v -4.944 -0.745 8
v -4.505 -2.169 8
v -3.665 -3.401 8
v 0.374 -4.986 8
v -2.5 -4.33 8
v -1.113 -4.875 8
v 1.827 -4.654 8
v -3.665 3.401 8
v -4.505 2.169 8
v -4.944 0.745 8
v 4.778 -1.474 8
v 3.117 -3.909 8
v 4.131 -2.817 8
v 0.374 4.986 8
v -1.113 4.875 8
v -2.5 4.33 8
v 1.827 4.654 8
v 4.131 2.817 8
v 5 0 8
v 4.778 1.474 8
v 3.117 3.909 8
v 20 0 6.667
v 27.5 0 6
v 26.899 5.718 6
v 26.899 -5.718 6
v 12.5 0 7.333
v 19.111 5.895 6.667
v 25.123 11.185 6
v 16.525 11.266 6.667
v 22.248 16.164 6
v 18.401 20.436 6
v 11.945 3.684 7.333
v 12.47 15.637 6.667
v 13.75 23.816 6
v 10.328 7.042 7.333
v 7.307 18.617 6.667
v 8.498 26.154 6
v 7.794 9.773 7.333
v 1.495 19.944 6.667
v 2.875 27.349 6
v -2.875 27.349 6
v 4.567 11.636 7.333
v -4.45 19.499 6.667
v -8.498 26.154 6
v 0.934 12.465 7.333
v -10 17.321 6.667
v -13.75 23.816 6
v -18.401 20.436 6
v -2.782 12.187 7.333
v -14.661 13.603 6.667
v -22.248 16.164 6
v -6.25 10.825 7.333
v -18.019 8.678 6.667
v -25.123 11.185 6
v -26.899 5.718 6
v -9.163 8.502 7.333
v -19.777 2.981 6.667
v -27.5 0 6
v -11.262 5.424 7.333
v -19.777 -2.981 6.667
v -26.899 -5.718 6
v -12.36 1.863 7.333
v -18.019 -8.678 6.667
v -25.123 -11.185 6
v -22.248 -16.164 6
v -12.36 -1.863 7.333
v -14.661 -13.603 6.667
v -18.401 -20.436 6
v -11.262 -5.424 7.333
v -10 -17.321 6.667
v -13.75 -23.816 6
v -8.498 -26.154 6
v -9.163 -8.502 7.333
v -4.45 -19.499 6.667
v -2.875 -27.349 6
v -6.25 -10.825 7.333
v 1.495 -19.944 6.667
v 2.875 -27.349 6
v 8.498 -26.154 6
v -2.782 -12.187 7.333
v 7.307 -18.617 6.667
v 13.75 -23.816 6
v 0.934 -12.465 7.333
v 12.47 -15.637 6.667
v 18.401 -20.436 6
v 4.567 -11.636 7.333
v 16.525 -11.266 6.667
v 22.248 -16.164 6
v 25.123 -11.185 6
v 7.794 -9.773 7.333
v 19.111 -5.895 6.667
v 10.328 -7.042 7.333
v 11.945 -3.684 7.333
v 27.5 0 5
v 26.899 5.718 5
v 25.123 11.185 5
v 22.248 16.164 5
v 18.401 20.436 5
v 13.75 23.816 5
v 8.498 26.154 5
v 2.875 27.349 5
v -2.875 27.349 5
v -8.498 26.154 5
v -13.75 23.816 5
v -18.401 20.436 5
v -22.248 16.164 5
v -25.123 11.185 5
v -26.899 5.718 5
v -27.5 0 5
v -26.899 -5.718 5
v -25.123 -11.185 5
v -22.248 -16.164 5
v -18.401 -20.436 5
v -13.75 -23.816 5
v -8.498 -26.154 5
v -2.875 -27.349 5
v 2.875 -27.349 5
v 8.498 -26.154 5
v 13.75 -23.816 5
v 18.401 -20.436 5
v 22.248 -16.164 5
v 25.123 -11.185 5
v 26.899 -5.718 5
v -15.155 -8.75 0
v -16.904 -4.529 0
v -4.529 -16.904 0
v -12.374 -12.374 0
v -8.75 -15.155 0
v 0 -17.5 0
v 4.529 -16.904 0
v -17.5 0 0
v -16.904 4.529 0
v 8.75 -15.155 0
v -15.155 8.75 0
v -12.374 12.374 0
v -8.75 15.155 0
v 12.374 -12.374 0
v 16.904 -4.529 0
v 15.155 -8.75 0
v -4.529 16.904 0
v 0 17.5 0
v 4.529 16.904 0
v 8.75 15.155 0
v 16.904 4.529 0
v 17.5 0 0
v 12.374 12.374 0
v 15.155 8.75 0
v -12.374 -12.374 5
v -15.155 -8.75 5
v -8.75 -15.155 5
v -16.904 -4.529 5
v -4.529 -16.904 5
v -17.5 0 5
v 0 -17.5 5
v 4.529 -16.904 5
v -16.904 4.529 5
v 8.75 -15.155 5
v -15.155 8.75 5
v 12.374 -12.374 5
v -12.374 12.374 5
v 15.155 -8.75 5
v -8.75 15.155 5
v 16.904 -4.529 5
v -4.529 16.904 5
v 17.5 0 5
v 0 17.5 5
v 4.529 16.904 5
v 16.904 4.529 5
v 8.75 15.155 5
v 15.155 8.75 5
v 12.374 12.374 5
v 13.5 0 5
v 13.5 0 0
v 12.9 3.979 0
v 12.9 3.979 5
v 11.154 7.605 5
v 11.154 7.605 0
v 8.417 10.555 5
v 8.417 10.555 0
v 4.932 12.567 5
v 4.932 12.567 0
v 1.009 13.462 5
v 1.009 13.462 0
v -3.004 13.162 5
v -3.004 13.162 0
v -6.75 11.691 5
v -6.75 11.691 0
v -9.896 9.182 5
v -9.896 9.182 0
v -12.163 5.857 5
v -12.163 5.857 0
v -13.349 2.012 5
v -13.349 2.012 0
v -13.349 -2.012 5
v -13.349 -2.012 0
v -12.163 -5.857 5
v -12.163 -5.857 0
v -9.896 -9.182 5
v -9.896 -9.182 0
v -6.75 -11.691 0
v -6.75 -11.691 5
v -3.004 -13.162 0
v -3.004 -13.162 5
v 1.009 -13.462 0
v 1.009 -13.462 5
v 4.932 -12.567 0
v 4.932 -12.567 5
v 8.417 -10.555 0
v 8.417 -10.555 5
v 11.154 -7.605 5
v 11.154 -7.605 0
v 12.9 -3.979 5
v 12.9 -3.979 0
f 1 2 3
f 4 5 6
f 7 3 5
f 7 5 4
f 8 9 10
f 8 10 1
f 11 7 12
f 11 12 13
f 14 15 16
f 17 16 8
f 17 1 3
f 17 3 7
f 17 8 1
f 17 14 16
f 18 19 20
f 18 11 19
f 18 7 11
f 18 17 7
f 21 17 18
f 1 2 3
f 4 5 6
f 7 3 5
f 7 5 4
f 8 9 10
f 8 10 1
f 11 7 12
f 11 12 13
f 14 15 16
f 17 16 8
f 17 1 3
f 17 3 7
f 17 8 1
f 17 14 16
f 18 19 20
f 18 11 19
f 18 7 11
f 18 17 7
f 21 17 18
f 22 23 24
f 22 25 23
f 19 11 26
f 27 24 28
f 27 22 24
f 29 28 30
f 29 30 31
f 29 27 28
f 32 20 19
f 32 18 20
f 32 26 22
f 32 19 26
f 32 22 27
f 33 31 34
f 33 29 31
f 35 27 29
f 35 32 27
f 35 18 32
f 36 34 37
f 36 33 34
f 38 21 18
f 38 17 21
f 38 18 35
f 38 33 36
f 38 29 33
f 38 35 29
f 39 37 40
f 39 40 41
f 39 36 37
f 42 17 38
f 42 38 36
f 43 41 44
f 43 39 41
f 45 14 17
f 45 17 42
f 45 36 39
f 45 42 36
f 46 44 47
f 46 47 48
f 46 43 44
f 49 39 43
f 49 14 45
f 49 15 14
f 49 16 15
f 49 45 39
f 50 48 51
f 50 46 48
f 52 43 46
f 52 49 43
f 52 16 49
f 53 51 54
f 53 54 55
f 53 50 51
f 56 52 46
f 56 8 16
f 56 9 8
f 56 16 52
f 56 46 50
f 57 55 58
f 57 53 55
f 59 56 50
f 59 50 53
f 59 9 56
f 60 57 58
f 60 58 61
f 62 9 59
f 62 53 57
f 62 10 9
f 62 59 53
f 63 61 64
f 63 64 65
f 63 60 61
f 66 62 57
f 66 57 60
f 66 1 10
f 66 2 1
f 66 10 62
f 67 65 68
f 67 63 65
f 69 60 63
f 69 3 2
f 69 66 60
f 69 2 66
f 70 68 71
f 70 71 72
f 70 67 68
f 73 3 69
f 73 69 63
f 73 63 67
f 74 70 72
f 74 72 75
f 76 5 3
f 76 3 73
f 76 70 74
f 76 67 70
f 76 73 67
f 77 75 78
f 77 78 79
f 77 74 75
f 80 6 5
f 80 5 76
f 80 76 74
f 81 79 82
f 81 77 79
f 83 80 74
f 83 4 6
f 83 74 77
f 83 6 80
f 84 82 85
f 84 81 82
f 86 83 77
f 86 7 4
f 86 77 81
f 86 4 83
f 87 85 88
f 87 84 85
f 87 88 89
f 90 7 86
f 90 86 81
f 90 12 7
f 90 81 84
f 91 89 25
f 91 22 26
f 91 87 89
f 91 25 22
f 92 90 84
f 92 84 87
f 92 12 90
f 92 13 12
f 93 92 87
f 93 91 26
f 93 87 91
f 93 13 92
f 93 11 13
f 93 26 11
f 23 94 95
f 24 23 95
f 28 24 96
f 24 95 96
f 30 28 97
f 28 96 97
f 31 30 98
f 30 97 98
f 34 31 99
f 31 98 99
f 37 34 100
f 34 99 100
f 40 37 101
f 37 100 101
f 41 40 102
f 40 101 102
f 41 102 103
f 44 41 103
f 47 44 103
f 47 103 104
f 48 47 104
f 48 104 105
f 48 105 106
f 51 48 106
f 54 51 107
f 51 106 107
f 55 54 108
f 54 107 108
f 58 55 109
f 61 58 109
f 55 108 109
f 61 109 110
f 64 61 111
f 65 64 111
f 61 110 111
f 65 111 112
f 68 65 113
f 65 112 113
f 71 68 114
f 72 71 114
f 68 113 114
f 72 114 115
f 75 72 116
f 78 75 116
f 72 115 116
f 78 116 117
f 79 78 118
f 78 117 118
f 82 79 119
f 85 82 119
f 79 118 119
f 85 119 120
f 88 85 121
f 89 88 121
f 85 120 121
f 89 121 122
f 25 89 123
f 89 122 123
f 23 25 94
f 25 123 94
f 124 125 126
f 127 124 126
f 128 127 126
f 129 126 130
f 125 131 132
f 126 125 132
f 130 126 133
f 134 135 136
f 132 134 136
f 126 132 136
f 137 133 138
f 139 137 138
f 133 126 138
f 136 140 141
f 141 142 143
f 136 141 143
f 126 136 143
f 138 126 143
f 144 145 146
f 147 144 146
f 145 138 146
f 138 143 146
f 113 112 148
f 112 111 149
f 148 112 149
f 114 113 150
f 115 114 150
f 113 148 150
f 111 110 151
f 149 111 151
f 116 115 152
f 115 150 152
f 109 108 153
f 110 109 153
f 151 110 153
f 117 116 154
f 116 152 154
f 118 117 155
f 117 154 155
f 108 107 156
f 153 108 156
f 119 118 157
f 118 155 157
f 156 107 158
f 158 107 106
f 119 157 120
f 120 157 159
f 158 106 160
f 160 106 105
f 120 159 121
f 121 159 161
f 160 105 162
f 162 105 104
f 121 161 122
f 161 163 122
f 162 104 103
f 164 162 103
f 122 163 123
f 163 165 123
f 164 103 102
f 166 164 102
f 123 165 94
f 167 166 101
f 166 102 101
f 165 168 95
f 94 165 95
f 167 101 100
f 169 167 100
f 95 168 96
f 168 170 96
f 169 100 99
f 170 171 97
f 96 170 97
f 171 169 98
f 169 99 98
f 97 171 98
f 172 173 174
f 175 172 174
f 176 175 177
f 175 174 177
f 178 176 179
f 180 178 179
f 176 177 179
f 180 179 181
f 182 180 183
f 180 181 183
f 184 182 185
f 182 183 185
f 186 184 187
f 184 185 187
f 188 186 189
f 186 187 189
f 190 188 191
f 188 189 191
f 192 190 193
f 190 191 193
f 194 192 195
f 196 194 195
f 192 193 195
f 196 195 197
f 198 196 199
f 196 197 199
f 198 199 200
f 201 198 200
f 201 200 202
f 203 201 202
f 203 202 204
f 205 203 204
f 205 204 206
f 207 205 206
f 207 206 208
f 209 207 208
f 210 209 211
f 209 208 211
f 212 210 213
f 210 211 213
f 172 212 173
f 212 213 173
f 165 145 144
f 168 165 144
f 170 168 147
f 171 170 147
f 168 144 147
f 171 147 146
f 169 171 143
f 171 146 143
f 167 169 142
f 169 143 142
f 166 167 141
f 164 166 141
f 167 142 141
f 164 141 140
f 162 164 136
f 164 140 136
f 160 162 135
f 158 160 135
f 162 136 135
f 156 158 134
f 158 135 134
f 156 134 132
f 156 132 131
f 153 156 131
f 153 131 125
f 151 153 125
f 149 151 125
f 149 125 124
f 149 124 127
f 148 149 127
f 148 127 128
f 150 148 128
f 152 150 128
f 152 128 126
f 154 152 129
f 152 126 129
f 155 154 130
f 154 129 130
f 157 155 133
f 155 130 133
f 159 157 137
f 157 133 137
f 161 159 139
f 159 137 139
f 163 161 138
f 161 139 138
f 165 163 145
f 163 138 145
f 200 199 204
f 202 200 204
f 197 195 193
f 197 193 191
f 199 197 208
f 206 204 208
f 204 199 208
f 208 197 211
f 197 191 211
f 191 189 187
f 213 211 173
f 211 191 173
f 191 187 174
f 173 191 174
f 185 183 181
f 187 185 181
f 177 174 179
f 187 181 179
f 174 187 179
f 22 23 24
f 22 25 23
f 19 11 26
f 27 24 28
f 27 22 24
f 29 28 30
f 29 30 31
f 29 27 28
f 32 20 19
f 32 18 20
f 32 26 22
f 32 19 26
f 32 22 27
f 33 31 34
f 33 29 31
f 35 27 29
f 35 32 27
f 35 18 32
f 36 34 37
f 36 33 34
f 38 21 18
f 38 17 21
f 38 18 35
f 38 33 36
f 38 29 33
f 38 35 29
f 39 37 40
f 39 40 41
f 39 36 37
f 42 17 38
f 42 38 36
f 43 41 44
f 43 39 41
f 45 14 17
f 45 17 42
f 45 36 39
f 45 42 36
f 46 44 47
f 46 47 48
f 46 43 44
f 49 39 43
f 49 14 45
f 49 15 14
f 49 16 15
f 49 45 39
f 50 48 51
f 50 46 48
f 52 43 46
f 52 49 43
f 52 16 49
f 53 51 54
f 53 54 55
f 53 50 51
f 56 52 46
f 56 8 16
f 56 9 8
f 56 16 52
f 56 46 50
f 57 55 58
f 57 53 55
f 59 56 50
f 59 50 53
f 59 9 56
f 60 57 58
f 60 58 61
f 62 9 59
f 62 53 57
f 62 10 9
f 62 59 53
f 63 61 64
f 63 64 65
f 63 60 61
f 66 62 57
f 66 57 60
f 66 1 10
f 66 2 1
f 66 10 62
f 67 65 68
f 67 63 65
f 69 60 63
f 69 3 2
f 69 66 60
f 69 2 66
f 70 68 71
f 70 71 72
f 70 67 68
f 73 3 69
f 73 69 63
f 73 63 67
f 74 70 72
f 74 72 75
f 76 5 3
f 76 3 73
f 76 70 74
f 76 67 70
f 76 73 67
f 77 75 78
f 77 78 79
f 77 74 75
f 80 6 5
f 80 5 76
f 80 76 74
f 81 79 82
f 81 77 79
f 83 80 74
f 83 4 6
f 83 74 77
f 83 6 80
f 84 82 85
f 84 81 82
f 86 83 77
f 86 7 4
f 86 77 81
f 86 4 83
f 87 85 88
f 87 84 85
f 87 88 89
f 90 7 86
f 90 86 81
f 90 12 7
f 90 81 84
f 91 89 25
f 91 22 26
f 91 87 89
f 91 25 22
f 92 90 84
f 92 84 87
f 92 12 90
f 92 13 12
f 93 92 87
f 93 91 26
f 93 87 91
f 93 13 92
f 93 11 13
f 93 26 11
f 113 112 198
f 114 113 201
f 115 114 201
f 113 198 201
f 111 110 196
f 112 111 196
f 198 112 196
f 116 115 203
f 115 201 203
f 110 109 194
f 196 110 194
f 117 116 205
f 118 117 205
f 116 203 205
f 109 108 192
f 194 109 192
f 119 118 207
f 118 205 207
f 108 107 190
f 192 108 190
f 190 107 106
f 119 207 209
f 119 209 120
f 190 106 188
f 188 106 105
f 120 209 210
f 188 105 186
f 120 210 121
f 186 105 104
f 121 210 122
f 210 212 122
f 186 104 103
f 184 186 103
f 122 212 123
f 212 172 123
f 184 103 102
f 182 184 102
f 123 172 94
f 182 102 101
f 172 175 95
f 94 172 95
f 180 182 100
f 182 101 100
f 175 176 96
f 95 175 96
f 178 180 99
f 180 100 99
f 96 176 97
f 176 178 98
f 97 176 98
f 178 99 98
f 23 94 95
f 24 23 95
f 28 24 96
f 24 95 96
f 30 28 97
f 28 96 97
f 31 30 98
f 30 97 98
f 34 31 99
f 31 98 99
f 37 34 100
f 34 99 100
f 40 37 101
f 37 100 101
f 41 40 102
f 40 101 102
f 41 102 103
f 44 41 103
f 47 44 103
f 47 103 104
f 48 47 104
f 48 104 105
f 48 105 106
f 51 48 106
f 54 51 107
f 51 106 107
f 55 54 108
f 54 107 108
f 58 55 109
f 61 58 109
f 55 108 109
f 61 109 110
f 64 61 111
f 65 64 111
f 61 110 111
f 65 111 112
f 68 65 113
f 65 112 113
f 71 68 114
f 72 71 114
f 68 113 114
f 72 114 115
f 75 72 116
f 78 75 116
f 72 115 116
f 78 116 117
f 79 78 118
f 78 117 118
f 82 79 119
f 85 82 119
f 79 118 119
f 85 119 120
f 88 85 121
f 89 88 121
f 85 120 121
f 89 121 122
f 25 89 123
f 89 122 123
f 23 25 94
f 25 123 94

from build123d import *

# Parameters (mm, degrees)
SKETCH_R     = 17.5
PAD_DEPTH    = 5
SKETCH001_R  = 27.5
PAD001_DEPTH = 1
SKETCH003_R  = 27.5
SKETCH002_R  = 5
SKETCH006_R  = 13.5
PAD002_DEPTH = 5
SKETCH004_R  = 27.5
PAD003_DEPTH = 1
SKETCH007_R  = 27.5
SKETCH005_R  = 5


with BuildPart() as body:
    # Sketch → Pad (new body)
    with BuildSketch(Plane.XY):
        Circle(SKETCH_R)
    extrude(amount=PAD_DEPTH)

    # Sketch001 (on Face3 of Pad) → Pad001 (join)
    with BuildSketch(Plane.XY.offset(5)):
        Circle(SKETCH001_R)
    extrude(amount=PAD001_DEPTH)

    # Sketch003 (on Face3 of Pad001) → AdditiveLoft section 0
    with BuildSketch(Plane.XY.offset(6)):
        Circle(SKETCH003_R)
    # Sketch002 → AdditiveLoft section 1
    with BuildSketch(Plane.XY.offset(8)):
        Circle(SKETCH002_R)
    loft()


with BuildPart() as body001:
    # Sketch006 → Pad002 (new body)
    with BuildSketch(Plane.XY):
        Circle(SKETCH006_R)
    extrude(amount=PAD002_DEPTH)

    # Sketch004 (on Face3 of Pad002) → Pad003 (join)
    with BuildSketch(Plane.XY.offset(5)):
        Circle(SKETCH004_R)
    extrude(amount=PAD003_DEPTH)

    # Sketch007 (on Face3 of Pad003) → AdditiveLoft001 section 0
    with BuildSketch(Plane.XY.offset(6)):
        Circle(SKETCH007_R)
    # Sketch005 → AdditiveLoft001 section 1
    with BuildSketch(Plane.XY.offset(8)):
        Circle(SKETCH005_R)
    loft()


solid = Compound([body.part, body001.part])
